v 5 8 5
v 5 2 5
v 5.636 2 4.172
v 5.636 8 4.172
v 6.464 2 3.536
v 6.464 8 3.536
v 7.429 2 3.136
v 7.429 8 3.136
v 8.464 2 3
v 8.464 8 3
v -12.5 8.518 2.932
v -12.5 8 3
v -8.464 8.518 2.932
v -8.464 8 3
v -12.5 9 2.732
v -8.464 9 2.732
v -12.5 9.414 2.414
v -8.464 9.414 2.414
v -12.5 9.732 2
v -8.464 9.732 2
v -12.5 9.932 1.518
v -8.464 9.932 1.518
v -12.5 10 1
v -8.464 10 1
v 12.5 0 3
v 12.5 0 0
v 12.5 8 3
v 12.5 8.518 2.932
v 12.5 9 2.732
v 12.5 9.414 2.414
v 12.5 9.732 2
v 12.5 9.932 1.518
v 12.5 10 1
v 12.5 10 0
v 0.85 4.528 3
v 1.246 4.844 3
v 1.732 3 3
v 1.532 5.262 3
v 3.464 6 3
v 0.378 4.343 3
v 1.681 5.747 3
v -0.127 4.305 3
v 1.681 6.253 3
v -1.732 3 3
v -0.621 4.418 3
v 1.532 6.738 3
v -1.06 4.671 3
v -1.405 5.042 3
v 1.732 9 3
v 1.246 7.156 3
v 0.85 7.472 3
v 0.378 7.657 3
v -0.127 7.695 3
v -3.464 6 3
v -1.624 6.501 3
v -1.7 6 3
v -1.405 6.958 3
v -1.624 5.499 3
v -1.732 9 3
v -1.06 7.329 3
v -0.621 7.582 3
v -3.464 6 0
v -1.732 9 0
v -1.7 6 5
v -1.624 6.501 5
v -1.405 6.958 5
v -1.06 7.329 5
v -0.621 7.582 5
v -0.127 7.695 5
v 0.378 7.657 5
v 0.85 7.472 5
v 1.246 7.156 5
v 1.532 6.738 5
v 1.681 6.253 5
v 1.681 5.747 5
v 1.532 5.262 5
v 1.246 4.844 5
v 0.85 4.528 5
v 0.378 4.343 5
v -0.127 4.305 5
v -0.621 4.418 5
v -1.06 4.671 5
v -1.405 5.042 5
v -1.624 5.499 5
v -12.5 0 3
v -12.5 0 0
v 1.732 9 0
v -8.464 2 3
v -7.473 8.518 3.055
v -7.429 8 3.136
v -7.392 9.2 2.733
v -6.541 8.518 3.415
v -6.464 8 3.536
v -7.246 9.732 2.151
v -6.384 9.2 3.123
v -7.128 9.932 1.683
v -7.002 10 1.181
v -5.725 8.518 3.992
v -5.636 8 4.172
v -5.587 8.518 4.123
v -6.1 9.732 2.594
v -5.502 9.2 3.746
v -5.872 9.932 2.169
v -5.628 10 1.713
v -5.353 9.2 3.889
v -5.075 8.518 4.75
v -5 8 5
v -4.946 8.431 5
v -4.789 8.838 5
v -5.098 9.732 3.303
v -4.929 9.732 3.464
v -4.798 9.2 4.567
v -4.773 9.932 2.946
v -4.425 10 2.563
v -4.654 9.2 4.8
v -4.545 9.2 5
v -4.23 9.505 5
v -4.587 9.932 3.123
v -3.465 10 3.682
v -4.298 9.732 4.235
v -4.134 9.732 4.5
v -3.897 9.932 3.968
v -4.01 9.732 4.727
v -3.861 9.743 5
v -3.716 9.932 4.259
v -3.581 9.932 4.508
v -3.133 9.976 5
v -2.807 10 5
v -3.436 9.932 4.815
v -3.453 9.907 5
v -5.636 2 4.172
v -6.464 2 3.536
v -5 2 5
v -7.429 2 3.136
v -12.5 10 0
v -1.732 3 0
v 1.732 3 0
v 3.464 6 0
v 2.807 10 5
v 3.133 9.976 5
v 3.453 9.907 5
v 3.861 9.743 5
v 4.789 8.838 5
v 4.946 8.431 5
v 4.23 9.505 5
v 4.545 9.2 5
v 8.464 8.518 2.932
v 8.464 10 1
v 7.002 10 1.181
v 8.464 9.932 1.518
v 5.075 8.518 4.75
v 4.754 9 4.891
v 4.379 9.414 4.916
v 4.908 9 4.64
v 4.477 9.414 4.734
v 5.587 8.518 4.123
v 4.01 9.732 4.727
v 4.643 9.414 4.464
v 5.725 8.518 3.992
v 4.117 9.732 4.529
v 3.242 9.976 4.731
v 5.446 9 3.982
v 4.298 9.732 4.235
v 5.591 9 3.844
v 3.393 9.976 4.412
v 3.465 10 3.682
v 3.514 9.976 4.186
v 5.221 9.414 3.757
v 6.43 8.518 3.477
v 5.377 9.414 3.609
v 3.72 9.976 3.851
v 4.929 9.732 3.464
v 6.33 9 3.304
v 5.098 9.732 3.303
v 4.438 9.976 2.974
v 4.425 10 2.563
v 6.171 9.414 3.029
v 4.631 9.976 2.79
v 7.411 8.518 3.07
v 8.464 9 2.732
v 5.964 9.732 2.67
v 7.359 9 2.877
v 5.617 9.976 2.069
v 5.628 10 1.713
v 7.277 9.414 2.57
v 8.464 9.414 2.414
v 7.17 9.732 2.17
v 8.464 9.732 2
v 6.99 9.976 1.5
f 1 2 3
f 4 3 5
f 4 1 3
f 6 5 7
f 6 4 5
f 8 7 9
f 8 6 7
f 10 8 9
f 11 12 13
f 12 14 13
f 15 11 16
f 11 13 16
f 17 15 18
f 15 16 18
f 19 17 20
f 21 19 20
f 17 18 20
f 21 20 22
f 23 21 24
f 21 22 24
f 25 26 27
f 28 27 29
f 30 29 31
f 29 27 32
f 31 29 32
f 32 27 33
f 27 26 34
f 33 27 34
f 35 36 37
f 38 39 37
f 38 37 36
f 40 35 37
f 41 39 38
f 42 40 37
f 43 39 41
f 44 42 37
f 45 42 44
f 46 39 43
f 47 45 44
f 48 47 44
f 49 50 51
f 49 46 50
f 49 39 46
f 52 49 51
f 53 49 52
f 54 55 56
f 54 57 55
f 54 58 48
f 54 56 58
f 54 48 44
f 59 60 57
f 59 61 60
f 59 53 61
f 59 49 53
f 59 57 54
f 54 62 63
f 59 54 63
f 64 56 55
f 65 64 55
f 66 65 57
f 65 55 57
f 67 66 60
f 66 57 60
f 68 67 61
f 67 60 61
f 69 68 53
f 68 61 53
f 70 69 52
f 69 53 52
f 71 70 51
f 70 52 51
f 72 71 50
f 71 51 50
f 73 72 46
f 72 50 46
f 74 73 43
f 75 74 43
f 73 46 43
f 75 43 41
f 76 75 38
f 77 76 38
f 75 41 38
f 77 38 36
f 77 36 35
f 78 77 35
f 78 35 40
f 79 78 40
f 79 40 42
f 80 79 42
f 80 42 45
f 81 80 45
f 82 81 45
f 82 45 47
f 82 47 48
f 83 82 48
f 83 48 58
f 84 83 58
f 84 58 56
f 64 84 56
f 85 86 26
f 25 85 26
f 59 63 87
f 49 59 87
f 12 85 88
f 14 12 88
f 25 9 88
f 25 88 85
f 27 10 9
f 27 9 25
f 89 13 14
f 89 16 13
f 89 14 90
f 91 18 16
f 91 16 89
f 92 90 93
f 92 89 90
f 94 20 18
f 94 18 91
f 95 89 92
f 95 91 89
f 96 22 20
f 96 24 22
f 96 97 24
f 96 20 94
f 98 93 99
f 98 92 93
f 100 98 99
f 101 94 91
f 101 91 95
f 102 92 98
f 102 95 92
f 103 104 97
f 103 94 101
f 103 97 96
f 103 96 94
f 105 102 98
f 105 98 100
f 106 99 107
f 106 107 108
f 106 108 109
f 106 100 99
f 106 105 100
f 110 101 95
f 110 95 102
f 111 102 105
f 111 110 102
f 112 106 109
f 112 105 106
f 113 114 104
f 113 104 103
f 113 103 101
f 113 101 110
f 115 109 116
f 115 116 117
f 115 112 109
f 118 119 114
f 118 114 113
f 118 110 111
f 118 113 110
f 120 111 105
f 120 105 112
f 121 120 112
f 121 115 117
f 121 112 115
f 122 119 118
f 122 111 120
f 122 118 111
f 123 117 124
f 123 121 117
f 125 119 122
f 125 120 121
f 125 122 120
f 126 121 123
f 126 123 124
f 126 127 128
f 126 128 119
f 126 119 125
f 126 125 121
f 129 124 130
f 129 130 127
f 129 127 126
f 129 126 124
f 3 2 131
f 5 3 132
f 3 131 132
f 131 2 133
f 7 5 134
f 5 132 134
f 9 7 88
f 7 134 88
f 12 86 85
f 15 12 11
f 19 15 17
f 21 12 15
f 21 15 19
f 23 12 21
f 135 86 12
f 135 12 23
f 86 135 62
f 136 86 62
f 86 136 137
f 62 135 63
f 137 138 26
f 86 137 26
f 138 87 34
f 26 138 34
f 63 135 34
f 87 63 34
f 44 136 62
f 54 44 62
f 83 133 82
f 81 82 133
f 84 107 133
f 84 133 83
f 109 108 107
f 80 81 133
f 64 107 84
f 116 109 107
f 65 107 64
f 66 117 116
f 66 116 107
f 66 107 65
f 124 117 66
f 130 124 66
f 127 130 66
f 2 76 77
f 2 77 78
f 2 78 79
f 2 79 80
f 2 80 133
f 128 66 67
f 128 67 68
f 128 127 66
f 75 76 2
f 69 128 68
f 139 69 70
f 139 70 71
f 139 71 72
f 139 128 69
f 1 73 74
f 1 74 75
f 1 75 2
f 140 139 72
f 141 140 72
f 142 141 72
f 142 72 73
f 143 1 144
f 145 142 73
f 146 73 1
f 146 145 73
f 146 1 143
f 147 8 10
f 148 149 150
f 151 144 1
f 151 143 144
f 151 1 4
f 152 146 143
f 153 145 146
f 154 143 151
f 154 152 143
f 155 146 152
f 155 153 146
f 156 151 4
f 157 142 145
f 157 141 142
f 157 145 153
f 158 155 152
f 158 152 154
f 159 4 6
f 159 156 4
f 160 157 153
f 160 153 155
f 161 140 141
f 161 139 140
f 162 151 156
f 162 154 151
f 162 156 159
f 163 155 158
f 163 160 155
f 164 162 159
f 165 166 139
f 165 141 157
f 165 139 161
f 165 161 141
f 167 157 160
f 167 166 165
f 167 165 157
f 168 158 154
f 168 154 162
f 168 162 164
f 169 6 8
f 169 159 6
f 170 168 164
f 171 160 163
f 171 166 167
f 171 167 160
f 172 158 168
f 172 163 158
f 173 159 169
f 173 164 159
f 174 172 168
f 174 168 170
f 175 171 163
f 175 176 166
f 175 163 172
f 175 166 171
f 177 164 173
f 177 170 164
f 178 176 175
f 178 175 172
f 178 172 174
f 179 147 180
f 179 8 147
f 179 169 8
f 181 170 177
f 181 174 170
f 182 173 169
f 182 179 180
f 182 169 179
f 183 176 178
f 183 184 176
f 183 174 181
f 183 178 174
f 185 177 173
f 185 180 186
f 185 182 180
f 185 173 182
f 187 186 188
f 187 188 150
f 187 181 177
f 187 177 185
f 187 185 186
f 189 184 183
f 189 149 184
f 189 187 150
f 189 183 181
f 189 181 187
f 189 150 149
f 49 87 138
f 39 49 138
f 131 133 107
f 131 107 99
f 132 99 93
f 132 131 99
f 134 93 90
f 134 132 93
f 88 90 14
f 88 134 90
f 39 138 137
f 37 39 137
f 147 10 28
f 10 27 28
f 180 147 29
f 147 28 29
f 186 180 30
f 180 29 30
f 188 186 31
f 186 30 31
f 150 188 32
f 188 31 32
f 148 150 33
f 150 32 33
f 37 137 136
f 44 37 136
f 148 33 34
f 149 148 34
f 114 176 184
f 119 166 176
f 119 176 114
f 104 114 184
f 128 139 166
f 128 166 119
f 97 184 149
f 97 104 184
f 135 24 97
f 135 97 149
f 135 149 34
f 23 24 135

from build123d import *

# Parameters (mm, degrees)
SKETCH2_W           = 25
SKETCH2_H           = 10
BOSS_EXTRUDE1_DEPTH = 3
SKETCH5_W           = 10
SKETCH5_H           = 8
BOSS_EXTRUDE3_DEPTH = 2
FILLET2_R           = 4
SKETCH8_R           = 1.7
CUT_EXTRUDE3_DEPTH  = 17.770509831
CUT_EXTRUDE4_DEPTH  = 3
FILLET3_R           = 2


with BuildPart() as part:
    # Sketch2 → Boss-Extrude1 (new body)
    with BuildSketch(Plane.XY):
        with Locations((0, 5)):
            Rectangle(SKETCH2_W, SKETCH2_H)
    extrude(amount=BOSS_EXTRUDE1_DEPTH)

    # Sketch5 → Boss-Extrude3 (add)
    with BuildSketch(Plane.XY.offset(3)):
        with Locations((0, 6)):
            Rectangle(SKETCH5_W, SKETCH5_H)
    extrude(amount=BOSS_EXTRUDE3_DEPTH)

    # Fillet2
    # the kernel refuses this fillet: 4 mm, written as the material it adds along each edge
    with BuildSketch(Plane(origin=(5, 10, 3), x_dir=(1, 0, 0), z_dir=(0, -1, 0)), Plane(origin=(-5, 2, 3), x_dir=(-1, 0, 0), z_dir=(0, 1, 0))) as fillet2_piece_1:
        with BuildLine():
            CenterArc((3.464101615, 4), FILLET2_R, 210, 60)
            Line((0, 2), (-0.069282032, 1.96))
            ThreePointArc((-0.069282032, 1.96), (-0.08, 1), (-0.08, 0))
            Line((-0.08, 0), (0, -0.08))
            Line((0, -0.08), (3.464101615, -0.08))
            Line((3.464101615, -0.08), (3.464101615, 0))
        make_face()
    extrude(amount=8)

    # Sketch8 → Cut-Extrude3 (cut, through all)
    with BuildSketch(Plane(origin=(0, 0, 0), x_dir=(-1, 0, 0), z_dir=(0, 0, -1))):
        with Locations((0, 6)):
            Circle(SKETCH8_R)
    extrude(amount=-CUT_EXTRUDE3_DEPTH, mode=Mode.SUBTRACT)

    # Sketch9 → Cut-Extrude4 (cut)
    with BuildSketch(Plane(origin=(0, 0, 0), x_dir=(-1, 0, 0), z_dir=(0, 0, -1))):
        Polygon((3.464101615, 6), (1.732050808, 9), (-1.732050808, 9), (-3.464101615, 6), (-1.732050808, 3), (1.732050808, 3), align=None)
    extrude(amount=-CUT_EXTRUDE4_DEPTH, mode=Mode.SUBTRACT)

    # Fillet3
    fillet3_edges = [part.edges().sort_by_distance(p)[0] for p in [
        (-10.482050808, 10, 3),
        (6.464101615, 10, 3.535898385),
        (-6.464101615, 10, 3.535898385),
        (10.482050808, 10, 3),
    ]]
    fillet(fillet3_edges, radius=FILLET3_R)


solid = part.part
